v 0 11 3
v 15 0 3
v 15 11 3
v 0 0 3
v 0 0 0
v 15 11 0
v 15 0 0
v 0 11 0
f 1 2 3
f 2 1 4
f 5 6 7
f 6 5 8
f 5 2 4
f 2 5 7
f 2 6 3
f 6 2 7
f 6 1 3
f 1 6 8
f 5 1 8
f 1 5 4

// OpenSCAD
// Generated by SolidPython 1.0.1 on 2020-07-29 00:46:55


cube(size = [15, 11, 3]);
/***********************************************
*********      SolidPython code:      **********
************************************************
 
# import packages: SolidPython
from solid import *
from solid.utils import *
from itertools import chain, combinations, permutations


class Resize:

    def __init__(self, scad_file):
        self.scad_file = scad_file
        #self.scad_file = import_scad(scad_file)
        # cone/cylinder param:
        self.r1 = 0
        self.r2 = 0
        self.h = 0
        # rectangular prism param:
        self.w = 0
        self.l = 0
        # ellipse param:
        self.r = 0

    # import OpenScad code (file name corresponds to shape)


    # classify shape + parameters
    def assign(self, param1, param2, param3):
        if self.scad_file == 'cone.scad':
            self.r1 = param1
            self.r2 = param2
            self.h = param3
        elif self.scad_file == 'cylinder.scad':
            self.r1 = param1
            self.r2 = param2
            self.h = param3
        elif self.scad_file == 'rectangularPrism.scad':
            self.h = param1
            self.l = param2
            self.w = param3
        else:
            self.r = param1
            self.h = param2

    # resize parameters
    def iterate(self):
        x = range(3, 20, 2)
        i = 1
        if self.scad_file == 'cone.scad':
            tempList = list(permutations(x, 2))
            for temp in tempList:
                param1 = temp[0]
                param2 = temp[1]
                filepath = 'produced_scad_files/' + 'cone' + str(param1) + '_' + str(param2) + '_' + '.scad'
                scad_render_to_file(cylinder(h=param1, r1=param2, r2=0), filepath)

        elif self.scad_file == 'cylinder.scad':
            tempList = list(permutations(x, 3))
            for temp in tempList:
                param1 = temp[0]
                param2 = temp[1]
                filepath = 'produced_scad_files/' + 'cylinder' + str(param1) + '_' + str(param2) + '_' + '.scad'
                scad_render_to_file(cylinder(h=param1, r1=param2, r2=param2), filepath)

        elif self.scad_file == 'rectangularPrism.scad':
            tempList = list(permutations(x, 3))
            for temp in tempList:
                param1 = temp[0]
                param2 = temp[1]
                param3 = temp[2]
                filepath = 'produced_scad_files/' + 'rectangularPrism' + str(param1) + '_' + str(param2) + '_' + str(
                    param3) + '.scad'
                scad_render_to_file(cube(size=(param1, param2, param3)), filepath)

        elif self.scad_file == 'ellipse.scad':
            tempList = list(permutations(x, 4))
            for temp in tempList:
                param1 = temp[0]
                param2 = temp[1]
                param3 = temp[2]
                param4 = temp[3]
                filepath = 'produced_scad_files/' + 'ellipse' + str(param1) + '_' + str(param2) + '_' + str(param3) + '_' + str(param4) + '.scad'
                scad_render_to_file(scale([param1, param2, param3])(sphere(r=param4)), filepath)

    def render_to_scadfile(self):
        scad_render_to_file(scad, 'example.scad') 
 
************************************************/
